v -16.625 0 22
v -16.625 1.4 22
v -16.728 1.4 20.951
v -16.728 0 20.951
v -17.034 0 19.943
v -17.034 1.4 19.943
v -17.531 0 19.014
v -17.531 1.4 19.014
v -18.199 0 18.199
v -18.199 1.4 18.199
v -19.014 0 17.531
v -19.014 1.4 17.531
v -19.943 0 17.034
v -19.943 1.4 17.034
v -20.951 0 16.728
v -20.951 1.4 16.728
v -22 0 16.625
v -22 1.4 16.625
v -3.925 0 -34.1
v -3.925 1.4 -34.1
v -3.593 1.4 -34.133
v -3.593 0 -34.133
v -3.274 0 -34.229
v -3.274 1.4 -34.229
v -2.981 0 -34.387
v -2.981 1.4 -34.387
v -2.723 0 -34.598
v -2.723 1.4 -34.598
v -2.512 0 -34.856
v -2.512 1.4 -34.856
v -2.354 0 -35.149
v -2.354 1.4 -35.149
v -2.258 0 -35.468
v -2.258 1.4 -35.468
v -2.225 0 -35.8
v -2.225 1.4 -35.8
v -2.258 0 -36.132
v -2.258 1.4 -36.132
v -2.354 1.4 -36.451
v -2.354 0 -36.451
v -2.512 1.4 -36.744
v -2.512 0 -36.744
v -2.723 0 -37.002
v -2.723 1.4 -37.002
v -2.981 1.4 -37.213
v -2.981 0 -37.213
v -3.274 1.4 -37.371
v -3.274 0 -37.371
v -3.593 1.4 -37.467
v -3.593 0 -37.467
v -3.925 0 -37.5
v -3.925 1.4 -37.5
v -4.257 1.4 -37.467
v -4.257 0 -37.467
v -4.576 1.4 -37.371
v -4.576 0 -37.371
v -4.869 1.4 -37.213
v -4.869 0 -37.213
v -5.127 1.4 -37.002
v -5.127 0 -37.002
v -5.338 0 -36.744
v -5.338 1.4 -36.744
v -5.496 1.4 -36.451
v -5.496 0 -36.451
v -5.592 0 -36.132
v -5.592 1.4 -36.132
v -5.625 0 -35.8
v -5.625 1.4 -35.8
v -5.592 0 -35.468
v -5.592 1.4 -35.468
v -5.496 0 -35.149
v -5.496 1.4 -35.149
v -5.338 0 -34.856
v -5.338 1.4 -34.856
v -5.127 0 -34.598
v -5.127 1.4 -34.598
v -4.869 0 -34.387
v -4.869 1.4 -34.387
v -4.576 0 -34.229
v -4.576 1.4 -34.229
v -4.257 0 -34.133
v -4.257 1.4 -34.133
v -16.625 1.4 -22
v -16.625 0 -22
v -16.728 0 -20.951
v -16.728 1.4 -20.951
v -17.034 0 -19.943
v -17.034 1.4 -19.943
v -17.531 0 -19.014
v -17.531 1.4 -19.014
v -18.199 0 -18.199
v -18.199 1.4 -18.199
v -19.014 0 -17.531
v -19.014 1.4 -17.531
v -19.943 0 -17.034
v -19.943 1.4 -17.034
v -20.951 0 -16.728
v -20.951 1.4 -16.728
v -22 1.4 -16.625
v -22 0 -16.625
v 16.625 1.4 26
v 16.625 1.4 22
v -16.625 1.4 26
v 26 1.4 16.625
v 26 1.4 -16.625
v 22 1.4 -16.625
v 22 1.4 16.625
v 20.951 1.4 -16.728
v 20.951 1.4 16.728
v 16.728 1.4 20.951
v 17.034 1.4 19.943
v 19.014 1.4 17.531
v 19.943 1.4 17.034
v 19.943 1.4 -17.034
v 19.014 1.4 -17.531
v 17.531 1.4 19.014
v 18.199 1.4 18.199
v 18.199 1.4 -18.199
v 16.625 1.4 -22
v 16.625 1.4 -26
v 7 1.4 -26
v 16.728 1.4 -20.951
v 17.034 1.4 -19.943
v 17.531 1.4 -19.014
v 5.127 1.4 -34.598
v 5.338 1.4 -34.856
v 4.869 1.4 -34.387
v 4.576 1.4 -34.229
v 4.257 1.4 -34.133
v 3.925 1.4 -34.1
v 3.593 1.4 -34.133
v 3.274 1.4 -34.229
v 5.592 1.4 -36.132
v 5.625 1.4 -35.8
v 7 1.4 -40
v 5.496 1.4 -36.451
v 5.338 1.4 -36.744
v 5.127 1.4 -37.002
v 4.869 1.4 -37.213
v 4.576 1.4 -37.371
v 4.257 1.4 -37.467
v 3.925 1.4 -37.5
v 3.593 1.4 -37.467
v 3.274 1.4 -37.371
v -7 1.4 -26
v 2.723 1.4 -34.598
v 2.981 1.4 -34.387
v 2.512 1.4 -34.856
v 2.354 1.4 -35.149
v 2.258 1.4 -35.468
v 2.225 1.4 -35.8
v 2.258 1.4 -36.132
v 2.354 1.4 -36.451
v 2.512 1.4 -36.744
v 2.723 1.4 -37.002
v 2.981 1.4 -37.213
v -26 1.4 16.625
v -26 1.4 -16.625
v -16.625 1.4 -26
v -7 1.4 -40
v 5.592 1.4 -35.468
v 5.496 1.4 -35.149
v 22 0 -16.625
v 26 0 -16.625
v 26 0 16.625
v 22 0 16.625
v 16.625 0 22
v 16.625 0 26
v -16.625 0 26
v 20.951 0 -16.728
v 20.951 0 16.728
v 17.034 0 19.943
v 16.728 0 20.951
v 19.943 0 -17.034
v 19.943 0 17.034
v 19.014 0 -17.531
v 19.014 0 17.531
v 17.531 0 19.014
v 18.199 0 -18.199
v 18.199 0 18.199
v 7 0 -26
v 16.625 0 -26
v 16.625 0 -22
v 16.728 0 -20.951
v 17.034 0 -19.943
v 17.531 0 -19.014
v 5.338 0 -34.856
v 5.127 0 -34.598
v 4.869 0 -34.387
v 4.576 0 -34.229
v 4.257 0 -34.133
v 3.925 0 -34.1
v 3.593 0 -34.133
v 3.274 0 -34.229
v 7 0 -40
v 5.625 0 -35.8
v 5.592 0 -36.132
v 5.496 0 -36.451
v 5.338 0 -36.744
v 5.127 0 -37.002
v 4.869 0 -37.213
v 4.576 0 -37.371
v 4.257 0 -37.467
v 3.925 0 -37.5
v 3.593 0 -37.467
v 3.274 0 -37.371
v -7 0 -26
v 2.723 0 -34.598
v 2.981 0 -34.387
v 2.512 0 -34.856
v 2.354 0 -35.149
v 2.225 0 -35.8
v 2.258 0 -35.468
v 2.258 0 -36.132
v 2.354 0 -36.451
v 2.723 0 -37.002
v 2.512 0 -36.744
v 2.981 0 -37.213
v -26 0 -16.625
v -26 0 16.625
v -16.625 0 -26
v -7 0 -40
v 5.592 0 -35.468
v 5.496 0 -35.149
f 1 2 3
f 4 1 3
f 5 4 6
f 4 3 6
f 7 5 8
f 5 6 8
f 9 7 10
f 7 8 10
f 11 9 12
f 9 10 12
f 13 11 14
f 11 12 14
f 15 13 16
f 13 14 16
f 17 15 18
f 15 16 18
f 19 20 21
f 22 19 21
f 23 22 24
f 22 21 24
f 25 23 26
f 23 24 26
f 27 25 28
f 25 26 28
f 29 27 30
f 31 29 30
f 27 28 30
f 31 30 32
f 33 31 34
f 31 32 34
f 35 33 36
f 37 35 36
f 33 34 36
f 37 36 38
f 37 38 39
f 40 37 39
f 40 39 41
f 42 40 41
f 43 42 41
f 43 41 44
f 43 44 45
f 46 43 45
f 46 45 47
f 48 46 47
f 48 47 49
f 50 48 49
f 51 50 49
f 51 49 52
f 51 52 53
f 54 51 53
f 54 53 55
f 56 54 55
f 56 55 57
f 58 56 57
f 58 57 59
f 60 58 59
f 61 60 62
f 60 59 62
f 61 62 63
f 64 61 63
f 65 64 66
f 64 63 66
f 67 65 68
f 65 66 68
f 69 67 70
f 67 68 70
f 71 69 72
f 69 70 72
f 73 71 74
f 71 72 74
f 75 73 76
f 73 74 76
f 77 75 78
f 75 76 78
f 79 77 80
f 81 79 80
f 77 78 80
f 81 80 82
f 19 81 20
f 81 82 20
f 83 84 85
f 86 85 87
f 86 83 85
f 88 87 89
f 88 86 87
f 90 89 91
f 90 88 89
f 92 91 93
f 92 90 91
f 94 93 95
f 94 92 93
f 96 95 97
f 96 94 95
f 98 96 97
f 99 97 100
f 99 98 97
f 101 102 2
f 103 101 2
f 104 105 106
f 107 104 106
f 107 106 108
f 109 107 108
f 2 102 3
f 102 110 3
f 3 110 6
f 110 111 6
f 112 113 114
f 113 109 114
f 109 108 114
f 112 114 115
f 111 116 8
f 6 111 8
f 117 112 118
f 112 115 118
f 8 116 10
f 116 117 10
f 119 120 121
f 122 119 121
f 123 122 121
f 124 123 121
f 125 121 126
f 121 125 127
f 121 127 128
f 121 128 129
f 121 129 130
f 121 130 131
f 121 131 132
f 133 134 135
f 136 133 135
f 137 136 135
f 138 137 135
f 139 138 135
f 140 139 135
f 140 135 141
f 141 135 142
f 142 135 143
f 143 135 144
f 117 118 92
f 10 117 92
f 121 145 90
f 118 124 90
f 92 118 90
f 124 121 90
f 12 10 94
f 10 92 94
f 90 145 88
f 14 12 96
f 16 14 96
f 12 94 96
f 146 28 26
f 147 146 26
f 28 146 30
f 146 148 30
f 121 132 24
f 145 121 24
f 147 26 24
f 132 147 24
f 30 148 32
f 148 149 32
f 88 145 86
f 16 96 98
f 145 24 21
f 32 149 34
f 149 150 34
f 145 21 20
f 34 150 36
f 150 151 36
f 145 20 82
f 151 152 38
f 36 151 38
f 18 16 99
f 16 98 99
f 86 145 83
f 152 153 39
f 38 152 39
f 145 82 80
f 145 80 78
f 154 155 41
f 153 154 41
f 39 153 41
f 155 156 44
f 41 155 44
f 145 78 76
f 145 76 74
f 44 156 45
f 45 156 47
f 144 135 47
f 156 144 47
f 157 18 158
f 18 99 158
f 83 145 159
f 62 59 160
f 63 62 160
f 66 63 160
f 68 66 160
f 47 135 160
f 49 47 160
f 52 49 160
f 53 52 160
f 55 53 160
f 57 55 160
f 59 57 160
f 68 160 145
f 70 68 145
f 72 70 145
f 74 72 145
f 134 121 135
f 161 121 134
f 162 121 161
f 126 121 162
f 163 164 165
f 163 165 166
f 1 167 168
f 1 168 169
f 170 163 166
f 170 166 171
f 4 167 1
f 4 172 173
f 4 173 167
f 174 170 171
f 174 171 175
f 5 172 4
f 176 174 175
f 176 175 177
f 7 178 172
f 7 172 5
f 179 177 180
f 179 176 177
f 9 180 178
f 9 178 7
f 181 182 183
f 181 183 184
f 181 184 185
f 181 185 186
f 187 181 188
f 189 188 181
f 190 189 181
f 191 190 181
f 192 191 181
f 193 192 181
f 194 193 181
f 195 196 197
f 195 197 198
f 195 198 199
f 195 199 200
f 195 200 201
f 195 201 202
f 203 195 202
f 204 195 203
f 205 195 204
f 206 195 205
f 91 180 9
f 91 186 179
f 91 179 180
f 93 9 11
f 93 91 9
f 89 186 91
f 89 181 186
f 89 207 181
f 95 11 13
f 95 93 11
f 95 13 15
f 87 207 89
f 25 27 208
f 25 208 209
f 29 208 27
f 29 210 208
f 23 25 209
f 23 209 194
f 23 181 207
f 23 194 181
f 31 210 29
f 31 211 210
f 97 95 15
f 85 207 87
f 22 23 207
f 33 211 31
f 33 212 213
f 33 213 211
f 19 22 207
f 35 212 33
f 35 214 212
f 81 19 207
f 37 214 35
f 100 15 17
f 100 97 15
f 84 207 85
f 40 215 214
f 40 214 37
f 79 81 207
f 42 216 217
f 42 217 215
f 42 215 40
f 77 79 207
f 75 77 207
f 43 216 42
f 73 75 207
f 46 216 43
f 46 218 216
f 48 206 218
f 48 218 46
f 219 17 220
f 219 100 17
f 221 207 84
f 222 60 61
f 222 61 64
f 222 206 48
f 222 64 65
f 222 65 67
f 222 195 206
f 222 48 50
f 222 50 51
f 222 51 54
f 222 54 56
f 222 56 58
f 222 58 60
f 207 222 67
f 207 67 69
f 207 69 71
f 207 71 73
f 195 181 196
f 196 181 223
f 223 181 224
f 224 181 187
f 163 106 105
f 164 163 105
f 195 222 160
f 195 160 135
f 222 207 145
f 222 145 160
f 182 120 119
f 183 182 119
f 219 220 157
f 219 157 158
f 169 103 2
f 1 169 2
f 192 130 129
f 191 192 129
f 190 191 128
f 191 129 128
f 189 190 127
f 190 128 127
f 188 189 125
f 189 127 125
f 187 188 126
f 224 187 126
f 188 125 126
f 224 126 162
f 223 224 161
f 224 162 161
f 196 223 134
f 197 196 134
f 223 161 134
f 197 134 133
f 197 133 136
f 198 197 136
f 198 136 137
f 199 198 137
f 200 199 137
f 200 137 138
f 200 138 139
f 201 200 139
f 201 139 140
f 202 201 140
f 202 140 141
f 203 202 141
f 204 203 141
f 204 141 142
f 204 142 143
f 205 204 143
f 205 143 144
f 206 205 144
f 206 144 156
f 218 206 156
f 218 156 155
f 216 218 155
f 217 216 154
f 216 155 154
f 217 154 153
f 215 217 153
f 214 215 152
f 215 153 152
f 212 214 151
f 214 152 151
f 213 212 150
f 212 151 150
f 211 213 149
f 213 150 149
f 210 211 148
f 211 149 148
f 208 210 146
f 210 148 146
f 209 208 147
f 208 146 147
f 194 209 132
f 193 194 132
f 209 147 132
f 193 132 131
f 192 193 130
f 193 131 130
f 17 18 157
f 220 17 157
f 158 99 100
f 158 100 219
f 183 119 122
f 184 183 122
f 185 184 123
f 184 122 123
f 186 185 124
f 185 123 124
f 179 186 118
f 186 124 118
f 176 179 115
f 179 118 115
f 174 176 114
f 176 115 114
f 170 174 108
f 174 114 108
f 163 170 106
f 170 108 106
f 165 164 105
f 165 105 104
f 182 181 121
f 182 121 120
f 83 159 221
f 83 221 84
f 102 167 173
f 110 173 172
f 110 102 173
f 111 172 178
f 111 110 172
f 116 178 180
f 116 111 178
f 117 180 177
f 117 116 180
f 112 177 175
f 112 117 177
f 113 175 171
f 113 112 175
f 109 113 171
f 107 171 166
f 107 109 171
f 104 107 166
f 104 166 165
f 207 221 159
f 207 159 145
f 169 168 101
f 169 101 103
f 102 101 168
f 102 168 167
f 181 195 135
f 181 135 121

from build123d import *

# Parameters (mm, degrees)
BOSS_EXTRUDE1_DEPTH = 1.4
SKETCH2_R           = 1.25
CUT_EXTRUDE2_DEPTH  = 48.727979216
CUT_EXTRUDE3_DEPTH  = 48.727979216
SKETCH6_R           = 1.7
CUT_EXTRUDE4_DEPTH  = 48.727979216


with BuildPart() as part:
    # Sketch1 → Boss-Extrude1 (new body)
    with BuildSketch(Plane(origin=(0, 0, 0), x_dir=(1, 0, 0), z_dir=(0, 1, 0))):
        Polygon((26, -26), (-26, -26), (-26, 26), (-7, 26), (-7, 40), (7, 40), (7, 26), (26, 26), align=None)
    extrude(amount=BOSS_EXTRUDE1_DEPTH)

    # Sketch2 → Cut-Extrude2 (cut, through all)
    with BuildSketch(Plane(origin=(0, 0, 0), x_dir=(1, 0, 0), z_dir=(0, 1, 0))):
        with Locations((-22, 22)):
            Circle(SKETCH2_R)
        with Locations((22, 22)):
            Circle(SKETCH2_R)
        with Locations((22, -22)):
            Circle(SKETCH2_R)
        with Locations((-22, -22)):
            Circle(SKETCH2_R)
    extrude(amount=CUT_EXTRUDE2_DEPTH, mode=Mode.SUBTRACT)

    # Sketch5 → Cut-Extrude3 (cut, through all)
    with BuildSketch(Plane(origin=(0, 1.4, 0), x_dir=(1, 0, 0), z_dir=(0, 1, 0))):
        with BuildLine():
            Line((-26, 26), (-16.625, 26))
            Line((-16.625, 26), (-16.625, 22))
            ThreePointArc((-16.625, 22), (-18.199301051, 18.199301051), (-22, 16.625))
            Line((-22, 16.625), (-26, 16.625))
            Line((-26, 16.625), (-26, 26))
        make_face()
        with BuildLine():
            Line((22, 16.625), (26, 16.625))
            Line((26, 16.625), (26, 26))
            Line((26, 26), (16.625, 26))
            Line((16.625, 26), (16.625, 22))
            ThreePointArc((16.625, 22), (18.199301051, 18.199301051), (22, 16.625))
        make_face()
        with BuildLine():
            Line((-22, -16.625), (-26, -16.625))
            Line((-26, -16.625), (-26, -26))
            Line((-26, -26), (-16.625, -26))
            Line((-16.625, -26), (-16.625, -22))
            ThreePointArc((-16.625, -22), (-18.199301051, -18.199301051), (-22, -16.625))
        make_face()
        with BuildLine():
            Line((26, -26), (16.625, -26))
            Line((16.625, -26), (16.625, -22))
            ThreePointArc((16.625, -22), (18.199301051, -18.199301051), (22, -16.625))
            Line((22, -16.625), (26, -16.625))
            Line((26, -16.625), (26, -26))
        make_face()
    extrude(amount=-CUT_EXTRUDE3_DEPTH, mode=Mode.SUBTRACT)

    # Sketch6 → Cut-Extrude4 (cut, through all)
    with BuildSketch(Plane(origin=(0, 1.4, 0), x_dir=(1, 0, 0), z_dir=(0, 1, 0))):
        with Locations((3.925, 35.8)):
            Circle(SKETCH6_R)
        with Locations((-3.925, 35.8)):
            Circle(SKETCH6_R)
    extrude(amount=-CUT_EXTRUDE4_DEPTH, mode=Mode.SUBTRACT)


solid = part.part
